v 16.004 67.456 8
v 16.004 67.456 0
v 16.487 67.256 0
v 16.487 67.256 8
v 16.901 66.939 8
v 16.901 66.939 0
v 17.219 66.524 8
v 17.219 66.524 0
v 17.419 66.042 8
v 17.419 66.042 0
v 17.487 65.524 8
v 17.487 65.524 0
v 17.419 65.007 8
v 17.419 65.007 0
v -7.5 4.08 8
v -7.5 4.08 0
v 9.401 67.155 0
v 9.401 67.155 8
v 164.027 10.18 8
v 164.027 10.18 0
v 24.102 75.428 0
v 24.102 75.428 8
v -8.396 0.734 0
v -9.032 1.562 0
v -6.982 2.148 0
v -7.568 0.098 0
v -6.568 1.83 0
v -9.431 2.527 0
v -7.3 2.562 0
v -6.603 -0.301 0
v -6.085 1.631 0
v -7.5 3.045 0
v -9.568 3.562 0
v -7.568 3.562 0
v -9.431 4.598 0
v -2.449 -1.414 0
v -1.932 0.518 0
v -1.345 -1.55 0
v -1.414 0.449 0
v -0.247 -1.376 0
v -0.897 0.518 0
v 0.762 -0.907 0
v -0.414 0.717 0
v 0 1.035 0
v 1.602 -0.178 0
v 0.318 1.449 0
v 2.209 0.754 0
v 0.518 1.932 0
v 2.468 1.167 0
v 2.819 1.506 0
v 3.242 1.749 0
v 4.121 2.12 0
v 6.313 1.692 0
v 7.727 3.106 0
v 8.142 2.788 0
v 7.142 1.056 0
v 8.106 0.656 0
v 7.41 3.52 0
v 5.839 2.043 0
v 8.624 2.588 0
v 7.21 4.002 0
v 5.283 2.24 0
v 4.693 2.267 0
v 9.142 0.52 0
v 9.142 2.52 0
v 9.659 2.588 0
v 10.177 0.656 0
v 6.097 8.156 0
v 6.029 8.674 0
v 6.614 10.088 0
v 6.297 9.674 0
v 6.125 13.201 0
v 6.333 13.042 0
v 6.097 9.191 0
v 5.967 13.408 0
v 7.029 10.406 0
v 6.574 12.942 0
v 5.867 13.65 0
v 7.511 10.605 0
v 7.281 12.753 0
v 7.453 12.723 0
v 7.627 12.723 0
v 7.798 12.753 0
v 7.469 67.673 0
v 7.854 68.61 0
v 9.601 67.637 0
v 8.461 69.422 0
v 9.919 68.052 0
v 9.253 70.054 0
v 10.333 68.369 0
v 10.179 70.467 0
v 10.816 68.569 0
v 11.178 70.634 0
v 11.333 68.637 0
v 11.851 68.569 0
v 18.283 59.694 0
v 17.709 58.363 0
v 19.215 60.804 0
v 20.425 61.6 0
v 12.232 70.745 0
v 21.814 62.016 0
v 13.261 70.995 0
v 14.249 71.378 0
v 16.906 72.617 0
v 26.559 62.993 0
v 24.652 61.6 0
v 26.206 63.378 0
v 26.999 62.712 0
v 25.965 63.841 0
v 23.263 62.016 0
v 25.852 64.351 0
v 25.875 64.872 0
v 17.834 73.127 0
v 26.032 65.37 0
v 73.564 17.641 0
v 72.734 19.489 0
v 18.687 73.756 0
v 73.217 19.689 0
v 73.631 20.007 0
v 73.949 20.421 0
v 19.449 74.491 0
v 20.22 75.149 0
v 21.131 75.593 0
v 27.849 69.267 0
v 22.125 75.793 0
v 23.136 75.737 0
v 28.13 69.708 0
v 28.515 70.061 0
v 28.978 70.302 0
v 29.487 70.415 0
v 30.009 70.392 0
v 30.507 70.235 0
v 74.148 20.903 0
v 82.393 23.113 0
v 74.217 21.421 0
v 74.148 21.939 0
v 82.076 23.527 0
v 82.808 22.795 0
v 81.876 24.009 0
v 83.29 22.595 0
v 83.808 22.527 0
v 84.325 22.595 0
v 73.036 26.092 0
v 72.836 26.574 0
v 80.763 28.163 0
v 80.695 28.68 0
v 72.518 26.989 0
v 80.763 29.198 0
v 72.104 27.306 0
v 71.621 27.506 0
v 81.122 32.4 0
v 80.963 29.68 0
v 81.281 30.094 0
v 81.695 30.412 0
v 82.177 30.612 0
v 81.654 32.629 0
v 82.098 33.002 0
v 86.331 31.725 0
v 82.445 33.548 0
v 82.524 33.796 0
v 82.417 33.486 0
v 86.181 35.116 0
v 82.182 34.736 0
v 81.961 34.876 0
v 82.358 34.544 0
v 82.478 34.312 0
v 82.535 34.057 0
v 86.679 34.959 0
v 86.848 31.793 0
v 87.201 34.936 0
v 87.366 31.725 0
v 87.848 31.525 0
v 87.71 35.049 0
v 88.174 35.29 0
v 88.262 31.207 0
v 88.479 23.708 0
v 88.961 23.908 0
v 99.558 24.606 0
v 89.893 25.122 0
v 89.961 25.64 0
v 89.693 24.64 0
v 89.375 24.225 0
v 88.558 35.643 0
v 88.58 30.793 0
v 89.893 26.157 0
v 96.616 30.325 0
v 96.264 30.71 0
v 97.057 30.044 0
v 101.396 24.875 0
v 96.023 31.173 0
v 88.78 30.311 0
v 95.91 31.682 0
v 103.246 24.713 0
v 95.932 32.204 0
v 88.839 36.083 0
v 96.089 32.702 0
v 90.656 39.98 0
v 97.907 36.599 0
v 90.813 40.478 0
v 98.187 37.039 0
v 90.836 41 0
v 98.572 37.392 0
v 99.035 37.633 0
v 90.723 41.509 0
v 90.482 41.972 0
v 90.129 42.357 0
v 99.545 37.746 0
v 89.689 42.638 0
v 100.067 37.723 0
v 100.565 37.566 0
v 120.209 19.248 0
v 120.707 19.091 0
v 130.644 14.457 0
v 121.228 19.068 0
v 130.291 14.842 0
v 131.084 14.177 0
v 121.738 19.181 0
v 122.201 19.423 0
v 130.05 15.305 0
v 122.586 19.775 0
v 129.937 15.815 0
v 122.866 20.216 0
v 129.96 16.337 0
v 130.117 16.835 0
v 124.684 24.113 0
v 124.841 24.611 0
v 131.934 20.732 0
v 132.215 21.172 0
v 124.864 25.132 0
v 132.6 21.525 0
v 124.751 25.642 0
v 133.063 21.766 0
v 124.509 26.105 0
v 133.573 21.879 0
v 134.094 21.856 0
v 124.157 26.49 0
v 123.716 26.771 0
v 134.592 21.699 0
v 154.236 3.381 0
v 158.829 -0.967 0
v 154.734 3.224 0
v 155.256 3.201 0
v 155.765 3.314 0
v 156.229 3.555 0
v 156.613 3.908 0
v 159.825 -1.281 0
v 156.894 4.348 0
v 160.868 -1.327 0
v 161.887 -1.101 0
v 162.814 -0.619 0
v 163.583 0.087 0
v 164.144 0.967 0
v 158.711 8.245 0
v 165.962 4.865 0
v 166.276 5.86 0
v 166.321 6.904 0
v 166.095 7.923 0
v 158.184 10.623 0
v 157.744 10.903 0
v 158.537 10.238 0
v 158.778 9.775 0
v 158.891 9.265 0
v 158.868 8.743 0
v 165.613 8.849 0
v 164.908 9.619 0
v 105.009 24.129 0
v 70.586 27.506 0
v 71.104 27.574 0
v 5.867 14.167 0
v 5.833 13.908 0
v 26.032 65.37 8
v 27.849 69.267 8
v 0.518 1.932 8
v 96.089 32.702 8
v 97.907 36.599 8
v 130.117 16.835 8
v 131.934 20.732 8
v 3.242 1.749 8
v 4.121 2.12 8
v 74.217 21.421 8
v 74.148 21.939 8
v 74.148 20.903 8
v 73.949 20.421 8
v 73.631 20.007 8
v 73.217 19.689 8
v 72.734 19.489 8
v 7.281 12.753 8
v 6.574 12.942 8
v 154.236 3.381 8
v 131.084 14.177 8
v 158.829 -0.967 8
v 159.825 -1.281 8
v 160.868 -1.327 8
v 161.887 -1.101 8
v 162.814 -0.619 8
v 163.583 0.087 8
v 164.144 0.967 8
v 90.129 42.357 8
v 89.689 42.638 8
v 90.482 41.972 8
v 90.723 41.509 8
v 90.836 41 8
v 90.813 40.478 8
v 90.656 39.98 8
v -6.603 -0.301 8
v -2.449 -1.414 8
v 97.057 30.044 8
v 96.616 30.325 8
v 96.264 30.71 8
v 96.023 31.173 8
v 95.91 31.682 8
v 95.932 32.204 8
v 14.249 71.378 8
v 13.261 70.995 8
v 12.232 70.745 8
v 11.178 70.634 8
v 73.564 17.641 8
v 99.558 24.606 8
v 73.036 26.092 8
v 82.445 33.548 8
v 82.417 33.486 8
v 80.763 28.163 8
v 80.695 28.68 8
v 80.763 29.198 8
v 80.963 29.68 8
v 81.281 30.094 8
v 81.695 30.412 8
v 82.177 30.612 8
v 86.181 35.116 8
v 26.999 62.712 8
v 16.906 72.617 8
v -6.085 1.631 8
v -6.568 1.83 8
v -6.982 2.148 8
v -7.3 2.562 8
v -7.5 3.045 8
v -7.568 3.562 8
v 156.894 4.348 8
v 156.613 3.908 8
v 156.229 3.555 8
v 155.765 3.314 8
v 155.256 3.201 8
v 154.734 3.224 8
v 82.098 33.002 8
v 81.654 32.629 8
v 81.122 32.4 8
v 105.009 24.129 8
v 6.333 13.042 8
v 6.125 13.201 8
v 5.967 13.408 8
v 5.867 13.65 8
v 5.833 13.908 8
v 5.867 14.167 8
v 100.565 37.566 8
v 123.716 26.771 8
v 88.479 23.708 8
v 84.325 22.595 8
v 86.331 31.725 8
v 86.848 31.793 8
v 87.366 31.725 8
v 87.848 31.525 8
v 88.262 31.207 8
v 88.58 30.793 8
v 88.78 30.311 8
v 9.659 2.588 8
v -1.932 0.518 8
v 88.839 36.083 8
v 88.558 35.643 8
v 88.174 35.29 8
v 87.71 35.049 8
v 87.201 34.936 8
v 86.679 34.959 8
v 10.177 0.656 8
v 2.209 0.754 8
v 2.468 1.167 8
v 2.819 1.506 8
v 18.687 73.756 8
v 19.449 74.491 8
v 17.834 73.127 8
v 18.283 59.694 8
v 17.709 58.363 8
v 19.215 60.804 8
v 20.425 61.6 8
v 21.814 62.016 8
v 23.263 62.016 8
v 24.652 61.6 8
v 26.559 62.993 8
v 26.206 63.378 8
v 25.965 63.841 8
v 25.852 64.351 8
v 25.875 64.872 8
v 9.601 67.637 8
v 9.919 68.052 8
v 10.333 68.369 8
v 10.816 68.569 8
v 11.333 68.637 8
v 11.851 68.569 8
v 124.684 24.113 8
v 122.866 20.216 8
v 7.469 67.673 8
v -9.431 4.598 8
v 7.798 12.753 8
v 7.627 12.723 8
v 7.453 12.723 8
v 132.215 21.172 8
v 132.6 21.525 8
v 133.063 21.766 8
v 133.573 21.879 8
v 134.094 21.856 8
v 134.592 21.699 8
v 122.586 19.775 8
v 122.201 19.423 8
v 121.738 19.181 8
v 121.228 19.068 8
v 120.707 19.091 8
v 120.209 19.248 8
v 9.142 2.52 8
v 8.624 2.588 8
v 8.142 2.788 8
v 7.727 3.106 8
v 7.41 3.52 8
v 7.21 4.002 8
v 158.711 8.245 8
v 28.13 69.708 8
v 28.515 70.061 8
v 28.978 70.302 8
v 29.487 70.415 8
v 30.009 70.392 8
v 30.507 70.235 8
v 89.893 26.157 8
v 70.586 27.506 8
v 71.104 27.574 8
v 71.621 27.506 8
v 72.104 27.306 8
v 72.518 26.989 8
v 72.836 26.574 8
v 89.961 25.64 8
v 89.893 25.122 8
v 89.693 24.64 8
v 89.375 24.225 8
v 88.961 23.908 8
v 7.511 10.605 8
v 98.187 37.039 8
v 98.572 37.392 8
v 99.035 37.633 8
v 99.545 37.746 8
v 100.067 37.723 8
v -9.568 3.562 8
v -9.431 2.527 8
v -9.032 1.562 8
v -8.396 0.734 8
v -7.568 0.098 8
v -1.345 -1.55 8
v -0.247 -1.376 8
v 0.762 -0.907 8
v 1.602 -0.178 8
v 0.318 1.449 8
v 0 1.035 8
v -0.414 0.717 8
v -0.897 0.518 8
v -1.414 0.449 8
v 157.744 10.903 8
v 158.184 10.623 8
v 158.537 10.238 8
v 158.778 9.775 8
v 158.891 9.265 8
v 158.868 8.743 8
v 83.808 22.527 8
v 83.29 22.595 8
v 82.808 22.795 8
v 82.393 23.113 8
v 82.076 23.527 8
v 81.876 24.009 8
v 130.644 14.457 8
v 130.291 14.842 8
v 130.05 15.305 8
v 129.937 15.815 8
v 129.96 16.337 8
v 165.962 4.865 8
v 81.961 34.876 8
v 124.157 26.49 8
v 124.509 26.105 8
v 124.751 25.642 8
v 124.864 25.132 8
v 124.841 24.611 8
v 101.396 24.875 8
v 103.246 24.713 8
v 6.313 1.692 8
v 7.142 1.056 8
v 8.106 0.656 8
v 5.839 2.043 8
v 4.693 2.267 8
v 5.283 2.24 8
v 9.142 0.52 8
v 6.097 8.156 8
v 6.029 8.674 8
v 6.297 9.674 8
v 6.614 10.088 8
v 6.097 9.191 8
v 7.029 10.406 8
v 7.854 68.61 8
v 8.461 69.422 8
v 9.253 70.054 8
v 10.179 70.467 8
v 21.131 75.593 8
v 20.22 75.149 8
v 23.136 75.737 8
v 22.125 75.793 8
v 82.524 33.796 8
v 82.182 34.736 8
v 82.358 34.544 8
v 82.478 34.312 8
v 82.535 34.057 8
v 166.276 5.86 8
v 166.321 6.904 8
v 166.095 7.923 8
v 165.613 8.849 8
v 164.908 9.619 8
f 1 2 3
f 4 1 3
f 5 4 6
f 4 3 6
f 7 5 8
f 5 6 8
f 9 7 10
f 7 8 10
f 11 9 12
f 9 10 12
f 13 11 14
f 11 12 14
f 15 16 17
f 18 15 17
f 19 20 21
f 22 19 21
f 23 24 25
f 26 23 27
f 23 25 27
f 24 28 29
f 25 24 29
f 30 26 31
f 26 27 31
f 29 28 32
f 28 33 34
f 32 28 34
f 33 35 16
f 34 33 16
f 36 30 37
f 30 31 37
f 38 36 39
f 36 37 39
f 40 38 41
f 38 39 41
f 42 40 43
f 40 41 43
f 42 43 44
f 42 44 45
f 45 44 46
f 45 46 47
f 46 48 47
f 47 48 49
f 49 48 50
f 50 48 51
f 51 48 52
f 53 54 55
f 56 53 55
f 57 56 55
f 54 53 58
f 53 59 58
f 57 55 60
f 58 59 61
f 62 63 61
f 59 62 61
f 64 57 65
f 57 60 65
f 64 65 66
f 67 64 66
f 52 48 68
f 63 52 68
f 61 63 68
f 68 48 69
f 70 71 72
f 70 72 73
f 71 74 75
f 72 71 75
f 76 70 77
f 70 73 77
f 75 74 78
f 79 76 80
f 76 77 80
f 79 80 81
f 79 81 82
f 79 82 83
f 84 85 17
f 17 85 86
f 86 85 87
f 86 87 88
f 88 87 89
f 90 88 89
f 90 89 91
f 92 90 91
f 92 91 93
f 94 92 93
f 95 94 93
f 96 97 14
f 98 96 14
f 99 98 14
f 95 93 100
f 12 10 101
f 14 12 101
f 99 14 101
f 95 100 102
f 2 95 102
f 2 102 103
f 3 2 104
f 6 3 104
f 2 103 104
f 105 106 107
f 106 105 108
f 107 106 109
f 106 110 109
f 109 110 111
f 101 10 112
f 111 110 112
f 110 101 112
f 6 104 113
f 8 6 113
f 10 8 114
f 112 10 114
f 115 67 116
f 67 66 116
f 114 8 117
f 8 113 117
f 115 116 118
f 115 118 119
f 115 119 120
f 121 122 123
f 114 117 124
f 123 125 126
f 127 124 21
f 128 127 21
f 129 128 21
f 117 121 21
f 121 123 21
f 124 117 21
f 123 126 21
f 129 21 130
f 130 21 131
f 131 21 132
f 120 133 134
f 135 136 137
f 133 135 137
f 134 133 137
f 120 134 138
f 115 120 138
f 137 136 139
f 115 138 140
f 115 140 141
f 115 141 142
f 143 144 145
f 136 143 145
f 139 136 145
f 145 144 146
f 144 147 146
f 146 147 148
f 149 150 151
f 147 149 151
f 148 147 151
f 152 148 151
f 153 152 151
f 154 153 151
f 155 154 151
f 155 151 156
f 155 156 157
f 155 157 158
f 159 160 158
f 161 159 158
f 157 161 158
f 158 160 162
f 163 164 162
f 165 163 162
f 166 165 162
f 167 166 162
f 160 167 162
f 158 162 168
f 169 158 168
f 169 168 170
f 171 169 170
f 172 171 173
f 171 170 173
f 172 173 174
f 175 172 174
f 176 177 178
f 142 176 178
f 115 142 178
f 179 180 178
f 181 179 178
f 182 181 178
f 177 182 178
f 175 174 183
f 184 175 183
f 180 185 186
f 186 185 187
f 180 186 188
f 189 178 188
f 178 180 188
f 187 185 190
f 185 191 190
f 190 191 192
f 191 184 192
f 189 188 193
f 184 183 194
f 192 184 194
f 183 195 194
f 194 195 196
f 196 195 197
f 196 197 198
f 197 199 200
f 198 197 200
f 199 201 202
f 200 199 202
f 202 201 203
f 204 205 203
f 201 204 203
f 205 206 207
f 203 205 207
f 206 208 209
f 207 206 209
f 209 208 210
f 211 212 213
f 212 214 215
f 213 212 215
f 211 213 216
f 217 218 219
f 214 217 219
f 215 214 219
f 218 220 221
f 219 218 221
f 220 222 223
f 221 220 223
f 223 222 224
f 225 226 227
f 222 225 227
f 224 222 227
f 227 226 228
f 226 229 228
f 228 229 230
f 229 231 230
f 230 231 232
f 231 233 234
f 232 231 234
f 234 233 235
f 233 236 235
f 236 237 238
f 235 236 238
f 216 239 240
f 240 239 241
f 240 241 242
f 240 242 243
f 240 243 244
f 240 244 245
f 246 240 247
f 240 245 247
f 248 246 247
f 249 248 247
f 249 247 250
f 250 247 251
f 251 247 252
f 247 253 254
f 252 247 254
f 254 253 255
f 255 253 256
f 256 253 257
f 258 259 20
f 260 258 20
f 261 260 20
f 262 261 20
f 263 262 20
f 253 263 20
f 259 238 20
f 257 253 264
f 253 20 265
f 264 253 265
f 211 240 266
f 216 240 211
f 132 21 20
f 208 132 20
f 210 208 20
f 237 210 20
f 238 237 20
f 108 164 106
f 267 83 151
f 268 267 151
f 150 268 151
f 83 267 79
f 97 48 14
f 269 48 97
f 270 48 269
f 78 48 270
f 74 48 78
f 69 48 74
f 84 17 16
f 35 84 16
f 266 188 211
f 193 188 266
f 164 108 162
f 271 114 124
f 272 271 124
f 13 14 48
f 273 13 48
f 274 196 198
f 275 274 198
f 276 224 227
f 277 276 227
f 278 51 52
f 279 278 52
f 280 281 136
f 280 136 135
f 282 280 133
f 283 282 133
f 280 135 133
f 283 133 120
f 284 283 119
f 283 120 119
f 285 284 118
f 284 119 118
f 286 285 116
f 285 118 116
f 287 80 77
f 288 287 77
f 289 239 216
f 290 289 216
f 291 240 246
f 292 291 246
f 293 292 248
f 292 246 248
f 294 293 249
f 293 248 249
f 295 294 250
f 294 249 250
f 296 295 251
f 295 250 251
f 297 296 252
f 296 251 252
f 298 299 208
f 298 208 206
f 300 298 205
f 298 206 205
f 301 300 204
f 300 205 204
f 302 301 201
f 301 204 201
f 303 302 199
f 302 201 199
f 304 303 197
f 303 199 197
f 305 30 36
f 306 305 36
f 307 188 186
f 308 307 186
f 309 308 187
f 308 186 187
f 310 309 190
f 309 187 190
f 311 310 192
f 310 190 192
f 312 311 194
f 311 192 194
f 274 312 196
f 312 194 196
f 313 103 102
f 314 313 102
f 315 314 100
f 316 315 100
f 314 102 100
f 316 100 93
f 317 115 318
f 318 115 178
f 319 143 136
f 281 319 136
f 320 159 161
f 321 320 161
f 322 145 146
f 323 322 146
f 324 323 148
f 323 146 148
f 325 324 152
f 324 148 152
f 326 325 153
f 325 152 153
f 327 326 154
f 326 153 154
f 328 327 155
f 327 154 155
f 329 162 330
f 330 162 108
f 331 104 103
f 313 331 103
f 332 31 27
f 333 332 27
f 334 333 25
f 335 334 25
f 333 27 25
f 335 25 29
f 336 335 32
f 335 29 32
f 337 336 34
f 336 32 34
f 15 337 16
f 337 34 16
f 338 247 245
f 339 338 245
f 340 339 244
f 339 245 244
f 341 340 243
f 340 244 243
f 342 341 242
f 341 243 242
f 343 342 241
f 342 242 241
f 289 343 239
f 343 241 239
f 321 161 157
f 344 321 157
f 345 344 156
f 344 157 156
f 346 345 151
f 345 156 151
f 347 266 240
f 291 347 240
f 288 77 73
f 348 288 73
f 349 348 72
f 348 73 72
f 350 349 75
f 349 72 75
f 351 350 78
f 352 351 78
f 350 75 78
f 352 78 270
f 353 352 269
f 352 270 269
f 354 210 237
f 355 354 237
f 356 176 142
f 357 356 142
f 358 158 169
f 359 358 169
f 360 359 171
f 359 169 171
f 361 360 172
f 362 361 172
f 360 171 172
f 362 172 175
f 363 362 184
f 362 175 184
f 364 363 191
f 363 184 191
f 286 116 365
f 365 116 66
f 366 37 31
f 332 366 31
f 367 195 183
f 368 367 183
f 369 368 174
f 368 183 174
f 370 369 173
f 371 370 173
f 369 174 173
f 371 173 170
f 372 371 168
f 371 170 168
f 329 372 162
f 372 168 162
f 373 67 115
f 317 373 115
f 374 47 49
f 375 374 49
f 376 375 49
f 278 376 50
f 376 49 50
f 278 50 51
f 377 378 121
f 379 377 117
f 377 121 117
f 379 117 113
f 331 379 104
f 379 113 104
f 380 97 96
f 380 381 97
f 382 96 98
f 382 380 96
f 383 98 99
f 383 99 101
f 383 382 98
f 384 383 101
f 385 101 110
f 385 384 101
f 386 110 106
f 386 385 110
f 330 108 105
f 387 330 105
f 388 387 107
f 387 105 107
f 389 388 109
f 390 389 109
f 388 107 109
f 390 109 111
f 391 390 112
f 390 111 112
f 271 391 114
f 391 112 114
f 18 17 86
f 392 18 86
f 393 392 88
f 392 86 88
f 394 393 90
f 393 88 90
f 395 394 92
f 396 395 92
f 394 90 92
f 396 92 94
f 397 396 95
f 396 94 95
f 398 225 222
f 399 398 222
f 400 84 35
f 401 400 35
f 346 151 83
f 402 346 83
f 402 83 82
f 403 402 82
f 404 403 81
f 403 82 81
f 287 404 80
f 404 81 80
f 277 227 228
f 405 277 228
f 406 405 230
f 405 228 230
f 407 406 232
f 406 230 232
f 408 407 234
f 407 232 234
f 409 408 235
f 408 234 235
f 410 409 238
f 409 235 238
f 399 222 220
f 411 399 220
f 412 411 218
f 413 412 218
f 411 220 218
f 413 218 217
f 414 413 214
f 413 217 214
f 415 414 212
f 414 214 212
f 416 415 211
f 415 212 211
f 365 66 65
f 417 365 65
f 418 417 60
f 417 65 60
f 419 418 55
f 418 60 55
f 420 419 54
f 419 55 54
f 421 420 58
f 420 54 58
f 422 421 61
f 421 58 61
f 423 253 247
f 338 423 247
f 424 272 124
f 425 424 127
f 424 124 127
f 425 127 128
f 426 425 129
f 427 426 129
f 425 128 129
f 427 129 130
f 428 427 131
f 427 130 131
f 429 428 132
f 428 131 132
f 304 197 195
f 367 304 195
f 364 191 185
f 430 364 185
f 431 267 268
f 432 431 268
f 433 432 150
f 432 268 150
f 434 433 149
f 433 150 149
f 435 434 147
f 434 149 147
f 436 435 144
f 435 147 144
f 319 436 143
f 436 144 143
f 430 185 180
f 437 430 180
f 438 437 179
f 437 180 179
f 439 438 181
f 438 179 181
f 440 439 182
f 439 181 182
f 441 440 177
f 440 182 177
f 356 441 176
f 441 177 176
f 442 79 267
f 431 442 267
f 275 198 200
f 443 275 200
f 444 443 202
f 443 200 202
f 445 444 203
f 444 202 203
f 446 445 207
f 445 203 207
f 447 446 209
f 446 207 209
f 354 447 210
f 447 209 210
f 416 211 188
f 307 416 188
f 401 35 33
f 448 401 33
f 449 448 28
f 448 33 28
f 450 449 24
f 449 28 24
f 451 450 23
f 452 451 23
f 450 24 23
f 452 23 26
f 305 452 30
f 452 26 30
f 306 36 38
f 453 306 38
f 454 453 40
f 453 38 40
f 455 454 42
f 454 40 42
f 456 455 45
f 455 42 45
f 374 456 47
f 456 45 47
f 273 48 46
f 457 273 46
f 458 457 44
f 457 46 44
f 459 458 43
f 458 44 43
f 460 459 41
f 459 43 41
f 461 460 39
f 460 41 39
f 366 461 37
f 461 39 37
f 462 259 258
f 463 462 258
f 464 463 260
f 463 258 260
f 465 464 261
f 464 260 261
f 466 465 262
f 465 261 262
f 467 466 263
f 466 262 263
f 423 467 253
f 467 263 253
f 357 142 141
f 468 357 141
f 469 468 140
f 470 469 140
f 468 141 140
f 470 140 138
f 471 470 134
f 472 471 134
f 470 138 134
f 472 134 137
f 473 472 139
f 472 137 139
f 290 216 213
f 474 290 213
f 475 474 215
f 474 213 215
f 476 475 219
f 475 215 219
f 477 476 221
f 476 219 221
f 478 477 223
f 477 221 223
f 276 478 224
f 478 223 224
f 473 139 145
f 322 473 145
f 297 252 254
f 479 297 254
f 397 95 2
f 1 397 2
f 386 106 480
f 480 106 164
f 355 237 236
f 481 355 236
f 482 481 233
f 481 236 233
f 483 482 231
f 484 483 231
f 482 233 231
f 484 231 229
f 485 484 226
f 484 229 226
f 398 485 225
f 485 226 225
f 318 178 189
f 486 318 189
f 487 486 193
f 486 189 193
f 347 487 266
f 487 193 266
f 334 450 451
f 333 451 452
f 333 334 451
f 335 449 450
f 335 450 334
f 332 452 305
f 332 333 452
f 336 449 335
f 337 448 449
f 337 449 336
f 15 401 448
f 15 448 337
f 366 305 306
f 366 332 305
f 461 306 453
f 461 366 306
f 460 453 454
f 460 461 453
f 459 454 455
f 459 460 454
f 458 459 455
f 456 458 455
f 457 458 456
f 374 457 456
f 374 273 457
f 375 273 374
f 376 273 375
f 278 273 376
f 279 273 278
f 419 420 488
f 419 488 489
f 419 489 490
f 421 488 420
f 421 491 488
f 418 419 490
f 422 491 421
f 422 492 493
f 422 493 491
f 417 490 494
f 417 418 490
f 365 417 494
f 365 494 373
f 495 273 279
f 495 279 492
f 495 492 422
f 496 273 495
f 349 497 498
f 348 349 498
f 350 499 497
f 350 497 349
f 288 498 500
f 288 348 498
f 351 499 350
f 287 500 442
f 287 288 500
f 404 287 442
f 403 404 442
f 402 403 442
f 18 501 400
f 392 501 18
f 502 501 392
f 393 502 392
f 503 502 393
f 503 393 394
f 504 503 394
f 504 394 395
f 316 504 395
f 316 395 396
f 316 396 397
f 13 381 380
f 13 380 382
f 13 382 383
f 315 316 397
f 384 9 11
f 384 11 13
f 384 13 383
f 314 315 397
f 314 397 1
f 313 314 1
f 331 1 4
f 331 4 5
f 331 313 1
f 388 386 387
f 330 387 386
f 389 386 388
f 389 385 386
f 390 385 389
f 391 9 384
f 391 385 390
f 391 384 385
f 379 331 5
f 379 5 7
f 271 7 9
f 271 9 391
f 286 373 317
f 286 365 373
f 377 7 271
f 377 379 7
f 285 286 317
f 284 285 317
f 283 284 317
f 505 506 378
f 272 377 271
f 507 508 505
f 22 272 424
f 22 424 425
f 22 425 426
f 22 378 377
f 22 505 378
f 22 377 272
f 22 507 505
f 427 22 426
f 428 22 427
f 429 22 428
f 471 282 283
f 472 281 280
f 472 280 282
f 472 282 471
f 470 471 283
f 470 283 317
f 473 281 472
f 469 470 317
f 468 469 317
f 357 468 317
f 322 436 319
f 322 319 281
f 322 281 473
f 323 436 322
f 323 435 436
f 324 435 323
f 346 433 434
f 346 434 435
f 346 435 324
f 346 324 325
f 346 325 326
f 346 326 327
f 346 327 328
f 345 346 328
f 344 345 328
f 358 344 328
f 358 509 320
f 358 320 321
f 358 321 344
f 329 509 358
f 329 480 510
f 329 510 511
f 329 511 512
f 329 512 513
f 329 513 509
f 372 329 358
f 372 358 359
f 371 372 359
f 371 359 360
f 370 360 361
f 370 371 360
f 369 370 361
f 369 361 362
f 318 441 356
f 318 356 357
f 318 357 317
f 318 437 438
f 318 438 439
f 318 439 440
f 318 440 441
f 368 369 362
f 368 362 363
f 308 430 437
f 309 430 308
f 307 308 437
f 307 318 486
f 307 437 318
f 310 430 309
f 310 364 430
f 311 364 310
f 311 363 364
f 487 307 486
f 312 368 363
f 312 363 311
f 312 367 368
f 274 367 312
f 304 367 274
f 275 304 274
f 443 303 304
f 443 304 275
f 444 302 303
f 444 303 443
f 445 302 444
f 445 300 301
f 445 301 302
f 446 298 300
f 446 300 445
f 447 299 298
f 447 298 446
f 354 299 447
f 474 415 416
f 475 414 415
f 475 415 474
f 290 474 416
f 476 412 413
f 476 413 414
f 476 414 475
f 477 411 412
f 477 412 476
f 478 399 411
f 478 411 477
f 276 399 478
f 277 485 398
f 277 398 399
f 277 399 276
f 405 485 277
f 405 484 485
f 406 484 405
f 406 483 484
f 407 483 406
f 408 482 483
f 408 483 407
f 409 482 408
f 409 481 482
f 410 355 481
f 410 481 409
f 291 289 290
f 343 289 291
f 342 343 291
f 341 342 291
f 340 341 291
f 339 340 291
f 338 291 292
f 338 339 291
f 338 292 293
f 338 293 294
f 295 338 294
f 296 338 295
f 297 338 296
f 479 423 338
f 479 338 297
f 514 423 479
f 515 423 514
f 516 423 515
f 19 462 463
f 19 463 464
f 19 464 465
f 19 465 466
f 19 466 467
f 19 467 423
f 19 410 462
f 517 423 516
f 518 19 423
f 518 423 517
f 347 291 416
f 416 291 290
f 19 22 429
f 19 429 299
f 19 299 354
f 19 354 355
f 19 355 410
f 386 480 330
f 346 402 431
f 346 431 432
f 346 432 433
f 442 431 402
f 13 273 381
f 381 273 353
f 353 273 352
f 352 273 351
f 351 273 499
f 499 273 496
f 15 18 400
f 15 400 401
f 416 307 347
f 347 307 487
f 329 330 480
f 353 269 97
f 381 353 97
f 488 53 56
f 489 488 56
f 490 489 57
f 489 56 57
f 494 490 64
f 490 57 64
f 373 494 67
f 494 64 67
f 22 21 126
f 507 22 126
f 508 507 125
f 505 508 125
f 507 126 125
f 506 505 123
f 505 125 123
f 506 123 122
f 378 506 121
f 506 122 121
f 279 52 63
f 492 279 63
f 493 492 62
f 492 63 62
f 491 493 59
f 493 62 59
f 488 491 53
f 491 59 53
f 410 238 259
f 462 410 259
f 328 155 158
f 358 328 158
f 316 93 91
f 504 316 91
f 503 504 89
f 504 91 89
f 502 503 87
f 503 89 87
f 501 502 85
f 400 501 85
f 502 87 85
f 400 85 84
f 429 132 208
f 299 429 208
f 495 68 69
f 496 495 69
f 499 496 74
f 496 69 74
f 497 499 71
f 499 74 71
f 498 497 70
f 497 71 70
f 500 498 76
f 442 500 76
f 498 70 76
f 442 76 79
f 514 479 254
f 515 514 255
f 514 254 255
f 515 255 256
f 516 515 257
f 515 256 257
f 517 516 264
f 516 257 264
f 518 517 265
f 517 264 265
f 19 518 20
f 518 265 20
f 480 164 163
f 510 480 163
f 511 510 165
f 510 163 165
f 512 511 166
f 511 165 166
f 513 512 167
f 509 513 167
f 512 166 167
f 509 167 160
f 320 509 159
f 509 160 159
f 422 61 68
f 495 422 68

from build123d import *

# Parameters (mm, degrees)
F1_DEPTH = 8
F2_R     = 5


with BuildPart() as f1:
    # F0 (on Top) → F1 (new body)
    with BuildSketch(Plane.XY):
        with BuildLine():
            ThreePointArc((14.248786, 71.37788), (12.750499, 70.853022), (11.178073, 70.634359))
            ThreePointArc((11.178073, 70.634359), (8.837059, 69.762961), (7.469486, 67.672644))
            Line((7.469486, 67.672644), (-9.431398, 4.597688))
            ThreePointArc((-9.431398, 4.597688), (-9.031796, 1.562412), (-6.602971, -0.301292))
            Line((-6.602971, -0.301292), (-2.44949, -1.414214))
            ThreePointArc((-2.44949, -1.414214), (0.273796, -1.176889), (2.208717, 0.754093))
            ThreePointArc((2.208717, 0.754093), (2.633248, 1.34737), (3.242311, 1.748924))
            Line((3.242311, 1.748924), (4.121107, 2.119931))
            ThreePointArc((4.121107, 2.119931), (5.282511, 2.240283), (6.313193, 1.691615))
            ThreePointArc((6.313193, 1.691615), (8.106344, 0.656339), (10.176896, 0.656339))
            Line((10.176896, 0.656339), (73.564489, 17.640993))
            Line((73.564489, 17.640993), (99.557932, 24.605915))
            ThreePointArc((99.557932, 24.605915), (102.325731, 24.848066), (105.009431, 24.128971))
            Line((105.009431, 24.128971), (158.828727, -0.967379))
            ThreePointArc((158.828727, -0.967379), (161.88728, -1.100918), (164.144431, 0.967379))
            Line((164.144431, 0.967379), (165.96169, 4.864503))
            ThreePointArc((165.96169, 4.864503), (166.095229, 7.923056), (164.026931, 10.180207))
            Line((164.026931, 10.180207), (24.101743, 75.428393))
            ThreePointArc((24.101743, 75.428393), (21.621409, 75.724402), (19.449104, 74.491205))
            ThreePointArc((19.449104, 74.491205), (18.270863, 73.42721), (16.905718, 72.616827))
            Line((16.905718, 72.616827), (14.248786, 71.37788))
        make_face()
        with BuildLine():
            ThreePointArc((9.659258, 2.58819), (8.14162, 2.787991), (7.209769, 4.002404))
            Line((7.209769, 4.002404), (6.096847, 8.155885))
            ThreePointArc((6.096847, 8.155885), (6.296647, 9.673523), (7.51106, 10.605375))
            Line((7.51106, 10.605375), (70.586017, 27.506258))
            ThreePointArc((70.586017, 27.506258), (72.103655, 27.306458), (73.035506, 26.092045))
            Line((73.035506, 26.092045), (74.148428, 21.938564))
            ThreePointArc((74.148428, 21.938564), (73.948627, 20.420926), (72.734215, 19.489074))
            Line((72.734215, 19.489074), (9.659258, 2.58819))
        make_face(mode=Mode.SUBTRACT)
        with BuildLine():
            Line((17.418522, 65.006808), (0.517638, 1.931852))
            ThreePointArc((0.517638, 1.931852), (-0.414214, 0.717439), (-1.931852, 0.517638))
            Line((-1.931852, 0.517638), (-6.085333, 1.63056))
            ThreePointArc((-6.085333, 1.63056), (-7.299745, 2.562412), (-7.499546, 4.08005))
            Line((-7.499546, 4.08005), (9.401337, 67.155006))
            ThreePointArc((9.401337, 67.155006), (10.333189, 68.369419), (11.850827, 68.56922))
            Line((11.850827, 68.56922), (16.004308, 67.456298))
            ThreePointArc((16.004308, 67.456298), (17.218721, 66.524446), (17.418522, 65.006808))
        make_face(mode=Mode.SUBTRACT)
        with BuildLine():
            Line((158.711227, 8.245449), (156.893969, 4.348325))
            ThreePointArc((156.893969, 4.348325), (155.765393, 3.314176), (154.236117, 3.380946))
            Line((154.236117, 3.380946), (131.08432, 14.176806))
            ThreePointArc((131.08432, 14.176806), (130.050171, 15.305382), (130.116941, 16.834658))
            Line((130.116941, 16.834658), (131.934199, 20.731782))
            ThreePointArc((131.934199, 20.731782), (133.062775, 21.765931), (134.592051, 21.699161))
            Line((134.592051, 21.699161), (157.743848, 10.903301))
            ThreePointArc((157.743848, 10.903301), (158.777997, 9.774725), (158.711227, 8.245449))
        make_face(mode=Mode.SUBTRACT)
        with BuildLine():
            Line((81.875835, 24.009116), (80.762913, 28.162597))
            ThreePointArc((80.762913, 28.162597), (80.962714, 29.680235), (82.177127, 30.612087))
            Line((82.177127, 30.612087), (86.330608, 31.725009))
            ThreePointArc((86.330608, 31.725009), (87.848246, 31.525208), (88.780097, 30.310795))
            Line((88.780097, 30.310795), (89.893019, 26.157314))
            ThreePointArc((89.893019, 26.157314), (89.693218, 24.639676), (88.478806, 23.707825))
            Line((88.478806, 23.707825), (84.325325, 22.594903))
            ThreePointArc((84.325325, 22.594903), (82.807687, 22.794703), (81.875835, 24.009116))
        make_face(mode=Mode.SUBTRACT)
        with BuildLine():
            Line((96.089451, 32.701938), (97.906709, 36.599061))
            ThreePointArc((97.906709, 36.599061), (99.035284, 37.63321), (100.564561, 37.56644))
            Line((100.564561, 37.56644), (123.716358, 26.77058))
            ThreePointArc((123.716358, 26.77058), (124.750507, 25.642005), (124.683737, 24.112728))
            Line((124.683737, 24.112728), (122.866479, 20.215604))
            ThreePointArc((122.866479, 20.215604), (121.737903, 19.181456), (120.208626, 19.248225))
            Line((120.208626, 19.248225), (97.05683, 30.044086))
            ThreePointArc((97.05683, 30.044086), (96.022681, 31.172661), (96.089451, 32.701938))
        make_face(mode=Mode.SUBTRACT)
        with BuildLine():
            ThreePointArc((6.573737, 12.94241), (5.966531, 13.408336), (5.86663, 14.167155))
            Line((5.86663, 14.167155), (19.251114, 64.118731))
            Line((19.251114, 64.118731), (81.961415, 34.876437))
            ThreePointArc((81.961415, 34.876437), (82.478489, 34.31215), (82.445104, 33.547511))
            Line((82.445104, 33.547511), (82.416626, 33.48644))
            ThreePointArc((82.416626, 33.48644), (81.889586, 32.799588), (81.121649, 32.399825))
            Line((81.121649, 32.399825), (7.798482, 12.752942))
            ThreePointArc((7.798482, 12.752942), (7.539663, 12.718867), (7.280844, 12.752942))
            Line((7.280844, 12.752942), (6.573737, 12.94241))
        make_face(mode=Mode.SUBTRACT)
        with BuildLine():
            ThreePointArc((26.999238, 62.712477), (25.965089, 63.841052), (26.031859, 65.370329))
            Line((26.031859, 65.370329), (27.849117, 69.267453))
            ThreePointArc((27.849117, 69.267453), (28.977692, 70.301601), (30.506969, 70.234832))
            Line((30.506969, 70.234832), (89.688868, 42.637859))
            ThreePointArc((89.688868, 42.637859), (90.723016, 41.509284), (90.656247, 39.980007))
            Line((90.656247, 39.980007), (88.838988, 36.082884))
            ThreePointArc((88.838988, 36.082884), (87.710413, 35.048735), (86.181136, 35.115505))
            Line((86.181136, 35.115505), (26.999238, 62.712477))
        make_face(mode=Mode.SUBTRACT)
    extrude(amount=F1_DEPTH)

    # F2
    f2_edges = [f1.edges().sort_by_distance(p)[0] for p in [
        (19.251114, 64.118731, 4),
    ]]
    fillet(f2_edges, radius=F2_R)


solid = f1.part
